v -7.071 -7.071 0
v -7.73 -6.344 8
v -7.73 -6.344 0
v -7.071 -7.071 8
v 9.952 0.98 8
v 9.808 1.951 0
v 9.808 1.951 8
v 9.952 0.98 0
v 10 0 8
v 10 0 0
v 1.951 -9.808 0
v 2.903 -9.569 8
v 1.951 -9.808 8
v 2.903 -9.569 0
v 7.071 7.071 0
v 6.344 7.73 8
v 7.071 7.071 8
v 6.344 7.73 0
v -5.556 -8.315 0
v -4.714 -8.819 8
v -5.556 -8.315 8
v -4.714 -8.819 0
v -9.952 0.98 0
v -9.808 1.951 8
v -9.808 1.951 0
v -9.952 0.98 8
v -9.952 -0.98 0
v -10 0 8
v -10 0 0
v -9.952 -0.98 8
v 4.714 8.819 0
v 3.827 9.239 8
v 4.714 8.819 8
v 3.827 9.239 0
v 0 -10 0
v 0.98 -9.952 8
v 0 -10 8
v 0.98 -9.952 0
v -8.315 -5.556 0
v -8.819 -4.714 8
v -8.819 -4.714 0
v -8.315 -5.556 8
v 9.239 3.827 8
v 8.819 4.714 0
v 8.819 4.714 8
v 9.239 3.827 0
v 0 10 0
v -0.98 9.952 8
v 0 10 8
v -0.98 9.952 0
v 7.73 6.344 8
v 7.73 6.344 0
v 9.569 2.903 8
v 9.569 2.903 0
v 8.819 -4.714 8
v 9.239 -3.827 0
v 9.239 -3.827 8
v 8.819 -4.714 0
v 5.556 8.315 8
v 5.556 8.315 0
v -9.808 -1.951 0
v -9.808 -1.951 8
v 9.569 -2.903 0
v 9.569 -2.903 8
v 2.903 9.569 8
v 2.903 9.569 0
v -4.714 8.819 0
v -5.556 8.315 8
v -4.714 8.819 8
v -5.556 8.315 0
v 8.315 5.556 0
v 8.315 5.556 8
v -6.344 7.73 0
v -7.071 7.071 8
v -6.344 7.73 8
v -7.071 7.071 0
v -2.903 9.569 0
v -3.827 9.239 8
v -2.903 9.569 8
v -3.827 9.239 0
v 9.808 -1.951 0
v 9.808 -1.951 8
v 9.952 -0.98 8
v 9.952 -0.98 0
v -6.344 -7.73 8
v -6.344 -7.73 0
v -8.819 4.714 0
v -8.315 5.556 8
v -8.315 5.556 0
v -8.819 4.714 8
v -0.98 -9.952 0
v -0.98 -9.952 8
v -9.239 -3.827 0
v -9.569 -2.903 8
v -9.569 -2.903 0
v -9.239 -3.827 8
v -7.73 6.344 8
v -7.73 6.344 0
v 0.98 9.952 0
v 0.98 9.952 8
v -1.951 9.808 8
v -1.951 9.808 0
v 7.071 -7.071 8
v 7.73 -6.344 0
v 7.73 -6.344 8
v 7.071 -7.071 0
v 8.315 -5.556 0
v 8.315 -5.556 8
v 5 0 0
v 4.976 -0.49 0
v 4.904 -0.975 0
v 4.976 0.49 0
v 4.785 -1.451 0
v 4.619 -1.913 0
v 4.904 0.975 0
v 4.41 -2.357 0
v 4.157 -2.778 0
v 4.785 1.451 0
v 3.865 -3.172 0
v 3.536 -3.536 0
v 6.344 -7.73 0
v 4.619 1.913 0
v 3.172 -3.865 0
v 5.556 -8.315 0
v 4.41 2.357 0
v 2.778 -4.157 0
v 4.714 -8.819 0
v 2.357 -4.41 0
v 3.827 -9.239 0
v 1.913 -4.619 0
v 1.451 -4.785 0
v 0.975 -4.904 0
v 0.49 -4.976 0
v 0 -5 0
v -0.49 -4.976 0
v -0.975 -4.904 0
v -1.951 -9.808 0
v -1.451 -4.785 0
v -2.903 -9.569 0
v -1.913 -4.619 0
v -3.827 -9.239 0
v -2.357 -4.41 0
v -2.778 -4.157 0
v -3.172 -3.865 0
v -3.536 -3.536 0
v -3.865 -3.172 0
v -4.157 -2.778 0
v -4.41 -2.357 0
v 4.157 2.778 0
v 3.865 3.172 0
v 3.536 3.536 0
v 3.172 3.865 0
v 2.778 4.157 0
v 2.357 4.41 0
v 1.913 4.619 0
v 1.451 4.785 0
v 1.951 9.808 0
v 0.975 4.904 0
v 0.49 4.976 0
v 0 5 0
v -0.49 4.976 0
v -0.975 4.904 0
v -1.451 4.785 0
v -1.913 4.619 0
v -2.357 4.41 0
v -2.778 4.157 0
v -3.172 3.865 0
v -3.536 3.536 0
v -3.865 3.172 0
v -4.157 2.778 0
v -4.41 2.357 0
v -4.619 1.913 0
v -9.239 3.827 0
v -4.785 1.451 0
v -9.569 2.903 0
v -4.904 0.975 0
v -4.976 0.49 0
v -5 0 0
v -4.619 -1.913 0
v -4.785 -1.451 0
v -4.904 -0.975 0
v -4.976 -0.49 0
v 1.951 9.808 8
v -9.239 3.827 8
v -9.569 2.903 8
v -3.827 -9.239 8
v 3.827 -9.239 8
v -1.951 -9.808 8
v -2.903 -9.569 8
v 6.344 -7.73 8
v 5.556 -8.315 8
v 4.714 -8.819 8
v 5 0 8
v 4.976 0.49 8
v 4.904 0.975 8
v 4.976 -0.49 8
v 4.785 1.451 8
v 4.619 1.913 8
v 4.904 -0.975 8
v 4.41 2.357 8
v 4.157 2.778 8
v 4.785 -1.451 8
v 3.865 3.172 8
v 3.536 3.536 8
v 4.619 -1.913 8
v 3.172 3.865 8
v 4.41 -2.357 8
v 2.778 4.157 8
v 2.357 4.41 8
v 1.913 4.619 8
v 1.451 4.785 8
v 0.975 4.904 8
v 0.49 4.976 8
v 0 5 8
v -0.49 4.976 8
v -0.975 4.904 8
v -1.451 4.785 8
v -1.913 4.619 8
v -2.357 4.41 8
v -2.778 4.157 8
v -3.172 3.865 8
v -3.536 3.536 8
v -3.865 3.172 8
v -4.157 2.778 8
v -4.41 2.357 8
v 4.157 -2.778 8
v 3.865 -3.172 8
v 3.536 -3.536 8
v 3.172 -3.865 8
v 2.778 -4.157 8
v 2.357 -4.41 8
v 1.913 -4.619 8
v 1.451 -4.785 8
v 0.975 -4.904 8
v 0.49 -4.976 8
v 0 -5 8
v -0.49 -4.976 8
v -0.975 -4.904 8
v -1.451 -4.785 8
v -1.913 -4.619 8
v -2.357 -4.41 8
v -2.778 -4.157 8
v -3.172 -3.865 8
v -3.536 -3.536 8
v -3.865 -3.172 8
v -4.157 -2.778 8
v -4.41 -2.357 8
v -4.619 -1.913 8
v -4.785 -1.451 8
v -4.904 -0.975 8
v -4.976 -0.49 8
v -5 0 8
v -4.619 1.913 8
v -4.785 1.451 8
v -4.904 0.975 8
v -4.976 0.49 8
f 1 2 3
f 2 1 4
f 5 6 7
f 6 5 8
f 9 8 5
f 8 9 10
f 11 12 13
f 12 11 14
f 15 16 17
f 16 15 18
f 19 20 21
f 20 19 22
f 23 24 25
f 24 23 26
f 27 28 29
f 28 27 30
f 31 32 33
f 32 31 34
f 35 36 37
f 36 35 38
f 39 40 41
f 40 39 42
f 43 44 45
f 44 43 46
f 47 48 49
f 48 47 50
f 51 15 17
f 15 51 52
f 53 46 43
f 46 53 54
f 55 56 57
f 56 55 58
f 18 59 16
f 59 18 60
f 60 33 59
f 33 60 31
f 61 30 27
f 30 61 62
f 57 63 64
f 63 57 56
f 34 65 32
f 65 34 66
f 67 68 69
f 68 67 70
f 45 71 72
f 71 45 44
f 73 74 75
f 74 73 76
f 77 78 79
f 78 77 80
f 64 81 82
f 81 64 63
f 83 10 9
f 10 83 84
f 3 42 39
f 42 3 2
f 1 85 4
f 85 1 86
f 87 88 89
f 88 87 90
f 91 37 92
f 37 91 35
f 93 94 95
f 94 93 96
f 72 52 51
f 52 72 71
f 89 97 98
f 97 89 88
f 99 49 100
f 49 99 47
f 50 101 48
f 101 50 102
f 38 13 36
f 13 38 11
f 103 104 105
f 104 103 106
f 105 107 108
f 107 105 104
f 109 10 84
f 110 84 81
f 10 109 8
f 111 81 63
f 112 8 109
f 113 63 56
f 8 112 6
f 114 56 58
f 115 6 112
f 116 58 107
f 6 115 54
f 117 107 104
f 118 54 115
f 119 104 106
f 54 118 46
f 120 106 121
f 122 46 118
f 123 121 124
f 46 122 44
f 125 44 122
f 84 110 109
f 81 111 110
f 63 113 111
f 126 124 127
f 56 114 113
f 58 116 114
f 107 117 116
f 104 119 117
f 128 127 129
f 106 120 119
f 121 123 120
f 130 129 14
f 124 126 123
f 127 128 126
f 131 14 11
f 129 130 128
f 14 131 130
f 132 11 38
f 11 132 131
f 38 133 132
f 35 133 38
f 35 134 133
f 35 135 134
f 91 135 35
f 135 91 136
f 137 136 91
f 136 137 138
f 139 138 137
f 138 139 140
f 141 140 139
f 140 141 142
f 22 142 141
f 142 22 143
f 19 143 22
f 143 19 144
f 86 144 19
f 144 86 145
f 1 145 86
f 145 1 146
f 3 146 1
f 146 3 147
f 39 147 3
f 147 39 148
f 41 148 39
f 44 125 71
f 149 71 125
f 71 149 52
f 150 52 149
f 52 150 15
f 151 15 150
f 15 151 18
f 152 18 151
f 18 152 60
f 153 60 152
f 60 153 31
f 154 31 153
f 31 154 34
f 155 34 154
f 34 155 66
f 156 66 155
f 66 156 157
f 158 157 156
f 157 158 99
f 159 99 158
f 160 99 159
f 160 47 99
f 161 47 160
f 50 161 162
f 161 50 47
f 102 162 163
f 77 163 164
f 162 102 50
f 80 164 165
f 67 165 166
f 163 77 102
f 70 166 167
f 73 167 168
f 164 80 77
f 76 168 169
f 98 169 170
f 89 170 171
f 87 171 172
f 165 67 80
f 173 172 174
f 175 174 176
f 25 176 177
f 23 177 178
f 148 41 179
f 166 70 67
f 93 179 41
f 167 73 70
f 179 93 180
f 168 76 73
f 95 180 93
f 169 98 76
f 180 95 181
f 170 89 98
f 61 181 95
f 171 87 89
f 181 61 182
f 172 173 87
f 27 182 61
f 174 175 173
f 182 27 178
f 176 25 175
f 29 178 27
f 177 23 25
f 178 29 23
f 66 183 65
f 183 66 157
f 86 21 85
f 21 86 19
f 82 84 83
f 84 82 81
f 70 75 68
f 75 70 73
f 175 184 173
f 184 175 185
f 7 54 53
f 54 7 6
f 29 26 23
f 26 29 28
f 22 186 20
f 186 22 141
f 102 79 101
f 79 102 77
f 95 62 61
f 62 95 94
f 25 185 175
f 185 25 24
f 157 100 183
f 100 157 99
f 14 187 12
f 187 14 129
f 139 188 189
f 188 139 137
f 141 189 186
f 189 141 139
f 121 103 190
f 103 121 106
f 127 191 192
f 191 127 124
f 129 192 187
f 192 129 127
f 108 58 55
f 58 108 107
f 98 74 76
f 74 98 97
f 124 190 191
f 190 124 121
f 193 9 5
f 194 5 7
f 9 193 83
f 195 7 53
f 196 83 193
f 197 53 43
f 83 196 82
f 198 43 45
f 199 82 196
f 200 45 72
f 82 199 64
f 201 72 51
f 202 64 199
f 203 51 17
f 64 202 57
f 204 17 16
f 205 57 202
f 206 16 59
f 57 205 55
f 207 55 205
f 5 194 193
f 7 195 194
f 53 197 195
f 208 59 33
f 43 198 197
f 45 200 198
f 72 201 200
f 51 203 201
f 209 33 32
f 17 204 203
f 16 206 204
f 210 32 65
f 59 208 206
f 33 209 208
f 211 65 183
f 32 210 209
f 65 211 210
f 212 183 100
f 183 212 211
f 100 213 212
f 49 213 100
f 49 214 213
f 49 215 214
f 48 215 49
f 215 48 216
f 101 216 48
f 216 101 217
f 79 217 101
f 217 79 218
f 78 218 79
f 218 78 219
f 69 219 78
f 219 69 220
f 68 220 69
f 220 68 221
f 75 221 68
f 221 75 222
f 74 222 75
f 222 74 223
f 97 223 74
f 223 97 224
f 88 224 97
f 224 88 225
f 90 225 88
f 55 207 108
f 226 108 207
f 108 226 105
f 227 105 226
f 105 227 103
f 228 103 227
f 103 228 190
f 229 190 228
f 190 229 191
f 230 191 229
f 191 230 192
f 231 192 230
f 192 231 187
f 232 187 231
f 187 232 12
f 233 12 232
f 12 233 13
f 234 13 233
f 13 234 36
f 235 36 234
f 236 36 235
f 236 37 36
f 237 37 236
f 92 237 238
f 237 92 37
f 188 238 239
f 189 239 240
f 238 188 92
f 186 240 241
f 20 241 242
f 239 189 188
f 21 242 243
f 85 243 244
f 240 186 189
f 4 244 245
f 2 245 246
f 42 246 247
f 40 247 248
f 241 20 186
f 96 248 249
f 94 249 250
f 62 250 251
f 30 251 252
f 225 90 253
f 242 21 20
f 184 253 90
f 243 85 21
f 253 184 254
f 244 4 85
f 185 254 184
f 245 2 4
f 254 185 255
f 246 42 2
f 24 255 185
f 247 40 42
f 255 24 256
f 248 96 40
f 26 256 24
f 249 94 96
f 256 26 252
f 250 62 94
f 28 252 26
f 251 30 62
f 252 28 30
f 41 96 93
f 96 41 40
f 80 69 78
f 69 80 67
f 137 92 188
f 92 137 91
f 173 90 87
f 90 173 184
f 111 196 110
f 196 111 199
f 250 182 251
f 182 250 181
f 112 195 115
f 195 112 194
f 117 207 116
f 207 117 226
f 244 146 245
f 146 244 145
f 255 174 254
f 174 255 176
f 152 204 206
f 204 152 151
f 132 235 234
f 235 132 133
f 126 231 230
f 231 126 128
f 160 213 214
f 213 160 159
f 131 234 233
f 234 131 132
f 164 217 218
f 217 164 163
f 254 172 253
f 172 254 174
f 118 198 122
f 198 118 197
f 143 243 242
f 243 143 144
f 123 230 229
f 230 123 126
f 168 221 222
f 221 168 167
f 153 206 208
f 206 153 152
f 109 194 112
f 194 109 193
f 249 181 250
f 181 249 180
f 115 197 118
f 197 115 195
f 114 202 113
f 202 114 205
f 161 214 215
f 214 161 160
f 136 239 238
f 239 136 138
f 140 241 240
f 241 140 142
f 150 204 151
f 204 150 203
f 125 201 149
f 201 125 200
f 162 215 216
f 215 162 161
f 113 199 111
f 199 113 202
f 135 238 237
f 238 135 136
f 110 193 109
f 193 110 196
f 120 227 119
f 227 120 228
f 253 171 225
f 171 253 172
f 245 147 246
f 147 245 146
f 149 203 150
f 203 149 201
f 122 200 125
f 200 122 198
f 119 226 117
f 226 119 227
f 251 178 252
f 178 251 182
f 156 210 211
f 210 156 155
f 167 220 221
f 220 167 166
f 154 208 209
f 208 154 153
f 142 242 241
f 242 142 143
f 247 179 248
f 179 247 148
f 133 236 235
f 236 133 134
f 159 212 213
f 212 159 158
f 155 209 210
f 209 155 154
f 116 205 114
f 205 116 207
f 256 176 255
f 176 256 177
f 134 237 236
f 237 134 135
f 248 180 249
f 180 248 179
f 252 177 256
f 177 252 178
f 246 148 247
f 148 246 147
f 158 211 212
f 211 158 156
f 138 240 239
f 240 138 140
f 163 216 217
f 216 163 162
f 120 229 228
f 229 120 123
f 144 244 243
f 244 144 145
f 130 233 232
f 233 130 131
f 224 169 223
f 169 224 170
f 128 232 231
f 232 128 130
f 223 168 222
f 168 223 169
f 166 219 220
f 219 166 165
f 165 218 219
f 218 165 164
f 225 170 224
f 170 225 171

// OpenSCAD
// bushing_param.scad
// param: inner_d=10, outer_d=20, thickness=8
module param_bushing(inner_d=10, outer_d=20, thickness=8) {
    difference(inner_d=40, outer_d=60, thickness=40) {
        cylinder(h = thickness, r=outer_d/2, $fn=64);
        cylinder(h = thickness+2, r=inner_d/2, $fn=64);
    }
}
param_bushing(inner_d=10, outer_d=20, thickness=8);
